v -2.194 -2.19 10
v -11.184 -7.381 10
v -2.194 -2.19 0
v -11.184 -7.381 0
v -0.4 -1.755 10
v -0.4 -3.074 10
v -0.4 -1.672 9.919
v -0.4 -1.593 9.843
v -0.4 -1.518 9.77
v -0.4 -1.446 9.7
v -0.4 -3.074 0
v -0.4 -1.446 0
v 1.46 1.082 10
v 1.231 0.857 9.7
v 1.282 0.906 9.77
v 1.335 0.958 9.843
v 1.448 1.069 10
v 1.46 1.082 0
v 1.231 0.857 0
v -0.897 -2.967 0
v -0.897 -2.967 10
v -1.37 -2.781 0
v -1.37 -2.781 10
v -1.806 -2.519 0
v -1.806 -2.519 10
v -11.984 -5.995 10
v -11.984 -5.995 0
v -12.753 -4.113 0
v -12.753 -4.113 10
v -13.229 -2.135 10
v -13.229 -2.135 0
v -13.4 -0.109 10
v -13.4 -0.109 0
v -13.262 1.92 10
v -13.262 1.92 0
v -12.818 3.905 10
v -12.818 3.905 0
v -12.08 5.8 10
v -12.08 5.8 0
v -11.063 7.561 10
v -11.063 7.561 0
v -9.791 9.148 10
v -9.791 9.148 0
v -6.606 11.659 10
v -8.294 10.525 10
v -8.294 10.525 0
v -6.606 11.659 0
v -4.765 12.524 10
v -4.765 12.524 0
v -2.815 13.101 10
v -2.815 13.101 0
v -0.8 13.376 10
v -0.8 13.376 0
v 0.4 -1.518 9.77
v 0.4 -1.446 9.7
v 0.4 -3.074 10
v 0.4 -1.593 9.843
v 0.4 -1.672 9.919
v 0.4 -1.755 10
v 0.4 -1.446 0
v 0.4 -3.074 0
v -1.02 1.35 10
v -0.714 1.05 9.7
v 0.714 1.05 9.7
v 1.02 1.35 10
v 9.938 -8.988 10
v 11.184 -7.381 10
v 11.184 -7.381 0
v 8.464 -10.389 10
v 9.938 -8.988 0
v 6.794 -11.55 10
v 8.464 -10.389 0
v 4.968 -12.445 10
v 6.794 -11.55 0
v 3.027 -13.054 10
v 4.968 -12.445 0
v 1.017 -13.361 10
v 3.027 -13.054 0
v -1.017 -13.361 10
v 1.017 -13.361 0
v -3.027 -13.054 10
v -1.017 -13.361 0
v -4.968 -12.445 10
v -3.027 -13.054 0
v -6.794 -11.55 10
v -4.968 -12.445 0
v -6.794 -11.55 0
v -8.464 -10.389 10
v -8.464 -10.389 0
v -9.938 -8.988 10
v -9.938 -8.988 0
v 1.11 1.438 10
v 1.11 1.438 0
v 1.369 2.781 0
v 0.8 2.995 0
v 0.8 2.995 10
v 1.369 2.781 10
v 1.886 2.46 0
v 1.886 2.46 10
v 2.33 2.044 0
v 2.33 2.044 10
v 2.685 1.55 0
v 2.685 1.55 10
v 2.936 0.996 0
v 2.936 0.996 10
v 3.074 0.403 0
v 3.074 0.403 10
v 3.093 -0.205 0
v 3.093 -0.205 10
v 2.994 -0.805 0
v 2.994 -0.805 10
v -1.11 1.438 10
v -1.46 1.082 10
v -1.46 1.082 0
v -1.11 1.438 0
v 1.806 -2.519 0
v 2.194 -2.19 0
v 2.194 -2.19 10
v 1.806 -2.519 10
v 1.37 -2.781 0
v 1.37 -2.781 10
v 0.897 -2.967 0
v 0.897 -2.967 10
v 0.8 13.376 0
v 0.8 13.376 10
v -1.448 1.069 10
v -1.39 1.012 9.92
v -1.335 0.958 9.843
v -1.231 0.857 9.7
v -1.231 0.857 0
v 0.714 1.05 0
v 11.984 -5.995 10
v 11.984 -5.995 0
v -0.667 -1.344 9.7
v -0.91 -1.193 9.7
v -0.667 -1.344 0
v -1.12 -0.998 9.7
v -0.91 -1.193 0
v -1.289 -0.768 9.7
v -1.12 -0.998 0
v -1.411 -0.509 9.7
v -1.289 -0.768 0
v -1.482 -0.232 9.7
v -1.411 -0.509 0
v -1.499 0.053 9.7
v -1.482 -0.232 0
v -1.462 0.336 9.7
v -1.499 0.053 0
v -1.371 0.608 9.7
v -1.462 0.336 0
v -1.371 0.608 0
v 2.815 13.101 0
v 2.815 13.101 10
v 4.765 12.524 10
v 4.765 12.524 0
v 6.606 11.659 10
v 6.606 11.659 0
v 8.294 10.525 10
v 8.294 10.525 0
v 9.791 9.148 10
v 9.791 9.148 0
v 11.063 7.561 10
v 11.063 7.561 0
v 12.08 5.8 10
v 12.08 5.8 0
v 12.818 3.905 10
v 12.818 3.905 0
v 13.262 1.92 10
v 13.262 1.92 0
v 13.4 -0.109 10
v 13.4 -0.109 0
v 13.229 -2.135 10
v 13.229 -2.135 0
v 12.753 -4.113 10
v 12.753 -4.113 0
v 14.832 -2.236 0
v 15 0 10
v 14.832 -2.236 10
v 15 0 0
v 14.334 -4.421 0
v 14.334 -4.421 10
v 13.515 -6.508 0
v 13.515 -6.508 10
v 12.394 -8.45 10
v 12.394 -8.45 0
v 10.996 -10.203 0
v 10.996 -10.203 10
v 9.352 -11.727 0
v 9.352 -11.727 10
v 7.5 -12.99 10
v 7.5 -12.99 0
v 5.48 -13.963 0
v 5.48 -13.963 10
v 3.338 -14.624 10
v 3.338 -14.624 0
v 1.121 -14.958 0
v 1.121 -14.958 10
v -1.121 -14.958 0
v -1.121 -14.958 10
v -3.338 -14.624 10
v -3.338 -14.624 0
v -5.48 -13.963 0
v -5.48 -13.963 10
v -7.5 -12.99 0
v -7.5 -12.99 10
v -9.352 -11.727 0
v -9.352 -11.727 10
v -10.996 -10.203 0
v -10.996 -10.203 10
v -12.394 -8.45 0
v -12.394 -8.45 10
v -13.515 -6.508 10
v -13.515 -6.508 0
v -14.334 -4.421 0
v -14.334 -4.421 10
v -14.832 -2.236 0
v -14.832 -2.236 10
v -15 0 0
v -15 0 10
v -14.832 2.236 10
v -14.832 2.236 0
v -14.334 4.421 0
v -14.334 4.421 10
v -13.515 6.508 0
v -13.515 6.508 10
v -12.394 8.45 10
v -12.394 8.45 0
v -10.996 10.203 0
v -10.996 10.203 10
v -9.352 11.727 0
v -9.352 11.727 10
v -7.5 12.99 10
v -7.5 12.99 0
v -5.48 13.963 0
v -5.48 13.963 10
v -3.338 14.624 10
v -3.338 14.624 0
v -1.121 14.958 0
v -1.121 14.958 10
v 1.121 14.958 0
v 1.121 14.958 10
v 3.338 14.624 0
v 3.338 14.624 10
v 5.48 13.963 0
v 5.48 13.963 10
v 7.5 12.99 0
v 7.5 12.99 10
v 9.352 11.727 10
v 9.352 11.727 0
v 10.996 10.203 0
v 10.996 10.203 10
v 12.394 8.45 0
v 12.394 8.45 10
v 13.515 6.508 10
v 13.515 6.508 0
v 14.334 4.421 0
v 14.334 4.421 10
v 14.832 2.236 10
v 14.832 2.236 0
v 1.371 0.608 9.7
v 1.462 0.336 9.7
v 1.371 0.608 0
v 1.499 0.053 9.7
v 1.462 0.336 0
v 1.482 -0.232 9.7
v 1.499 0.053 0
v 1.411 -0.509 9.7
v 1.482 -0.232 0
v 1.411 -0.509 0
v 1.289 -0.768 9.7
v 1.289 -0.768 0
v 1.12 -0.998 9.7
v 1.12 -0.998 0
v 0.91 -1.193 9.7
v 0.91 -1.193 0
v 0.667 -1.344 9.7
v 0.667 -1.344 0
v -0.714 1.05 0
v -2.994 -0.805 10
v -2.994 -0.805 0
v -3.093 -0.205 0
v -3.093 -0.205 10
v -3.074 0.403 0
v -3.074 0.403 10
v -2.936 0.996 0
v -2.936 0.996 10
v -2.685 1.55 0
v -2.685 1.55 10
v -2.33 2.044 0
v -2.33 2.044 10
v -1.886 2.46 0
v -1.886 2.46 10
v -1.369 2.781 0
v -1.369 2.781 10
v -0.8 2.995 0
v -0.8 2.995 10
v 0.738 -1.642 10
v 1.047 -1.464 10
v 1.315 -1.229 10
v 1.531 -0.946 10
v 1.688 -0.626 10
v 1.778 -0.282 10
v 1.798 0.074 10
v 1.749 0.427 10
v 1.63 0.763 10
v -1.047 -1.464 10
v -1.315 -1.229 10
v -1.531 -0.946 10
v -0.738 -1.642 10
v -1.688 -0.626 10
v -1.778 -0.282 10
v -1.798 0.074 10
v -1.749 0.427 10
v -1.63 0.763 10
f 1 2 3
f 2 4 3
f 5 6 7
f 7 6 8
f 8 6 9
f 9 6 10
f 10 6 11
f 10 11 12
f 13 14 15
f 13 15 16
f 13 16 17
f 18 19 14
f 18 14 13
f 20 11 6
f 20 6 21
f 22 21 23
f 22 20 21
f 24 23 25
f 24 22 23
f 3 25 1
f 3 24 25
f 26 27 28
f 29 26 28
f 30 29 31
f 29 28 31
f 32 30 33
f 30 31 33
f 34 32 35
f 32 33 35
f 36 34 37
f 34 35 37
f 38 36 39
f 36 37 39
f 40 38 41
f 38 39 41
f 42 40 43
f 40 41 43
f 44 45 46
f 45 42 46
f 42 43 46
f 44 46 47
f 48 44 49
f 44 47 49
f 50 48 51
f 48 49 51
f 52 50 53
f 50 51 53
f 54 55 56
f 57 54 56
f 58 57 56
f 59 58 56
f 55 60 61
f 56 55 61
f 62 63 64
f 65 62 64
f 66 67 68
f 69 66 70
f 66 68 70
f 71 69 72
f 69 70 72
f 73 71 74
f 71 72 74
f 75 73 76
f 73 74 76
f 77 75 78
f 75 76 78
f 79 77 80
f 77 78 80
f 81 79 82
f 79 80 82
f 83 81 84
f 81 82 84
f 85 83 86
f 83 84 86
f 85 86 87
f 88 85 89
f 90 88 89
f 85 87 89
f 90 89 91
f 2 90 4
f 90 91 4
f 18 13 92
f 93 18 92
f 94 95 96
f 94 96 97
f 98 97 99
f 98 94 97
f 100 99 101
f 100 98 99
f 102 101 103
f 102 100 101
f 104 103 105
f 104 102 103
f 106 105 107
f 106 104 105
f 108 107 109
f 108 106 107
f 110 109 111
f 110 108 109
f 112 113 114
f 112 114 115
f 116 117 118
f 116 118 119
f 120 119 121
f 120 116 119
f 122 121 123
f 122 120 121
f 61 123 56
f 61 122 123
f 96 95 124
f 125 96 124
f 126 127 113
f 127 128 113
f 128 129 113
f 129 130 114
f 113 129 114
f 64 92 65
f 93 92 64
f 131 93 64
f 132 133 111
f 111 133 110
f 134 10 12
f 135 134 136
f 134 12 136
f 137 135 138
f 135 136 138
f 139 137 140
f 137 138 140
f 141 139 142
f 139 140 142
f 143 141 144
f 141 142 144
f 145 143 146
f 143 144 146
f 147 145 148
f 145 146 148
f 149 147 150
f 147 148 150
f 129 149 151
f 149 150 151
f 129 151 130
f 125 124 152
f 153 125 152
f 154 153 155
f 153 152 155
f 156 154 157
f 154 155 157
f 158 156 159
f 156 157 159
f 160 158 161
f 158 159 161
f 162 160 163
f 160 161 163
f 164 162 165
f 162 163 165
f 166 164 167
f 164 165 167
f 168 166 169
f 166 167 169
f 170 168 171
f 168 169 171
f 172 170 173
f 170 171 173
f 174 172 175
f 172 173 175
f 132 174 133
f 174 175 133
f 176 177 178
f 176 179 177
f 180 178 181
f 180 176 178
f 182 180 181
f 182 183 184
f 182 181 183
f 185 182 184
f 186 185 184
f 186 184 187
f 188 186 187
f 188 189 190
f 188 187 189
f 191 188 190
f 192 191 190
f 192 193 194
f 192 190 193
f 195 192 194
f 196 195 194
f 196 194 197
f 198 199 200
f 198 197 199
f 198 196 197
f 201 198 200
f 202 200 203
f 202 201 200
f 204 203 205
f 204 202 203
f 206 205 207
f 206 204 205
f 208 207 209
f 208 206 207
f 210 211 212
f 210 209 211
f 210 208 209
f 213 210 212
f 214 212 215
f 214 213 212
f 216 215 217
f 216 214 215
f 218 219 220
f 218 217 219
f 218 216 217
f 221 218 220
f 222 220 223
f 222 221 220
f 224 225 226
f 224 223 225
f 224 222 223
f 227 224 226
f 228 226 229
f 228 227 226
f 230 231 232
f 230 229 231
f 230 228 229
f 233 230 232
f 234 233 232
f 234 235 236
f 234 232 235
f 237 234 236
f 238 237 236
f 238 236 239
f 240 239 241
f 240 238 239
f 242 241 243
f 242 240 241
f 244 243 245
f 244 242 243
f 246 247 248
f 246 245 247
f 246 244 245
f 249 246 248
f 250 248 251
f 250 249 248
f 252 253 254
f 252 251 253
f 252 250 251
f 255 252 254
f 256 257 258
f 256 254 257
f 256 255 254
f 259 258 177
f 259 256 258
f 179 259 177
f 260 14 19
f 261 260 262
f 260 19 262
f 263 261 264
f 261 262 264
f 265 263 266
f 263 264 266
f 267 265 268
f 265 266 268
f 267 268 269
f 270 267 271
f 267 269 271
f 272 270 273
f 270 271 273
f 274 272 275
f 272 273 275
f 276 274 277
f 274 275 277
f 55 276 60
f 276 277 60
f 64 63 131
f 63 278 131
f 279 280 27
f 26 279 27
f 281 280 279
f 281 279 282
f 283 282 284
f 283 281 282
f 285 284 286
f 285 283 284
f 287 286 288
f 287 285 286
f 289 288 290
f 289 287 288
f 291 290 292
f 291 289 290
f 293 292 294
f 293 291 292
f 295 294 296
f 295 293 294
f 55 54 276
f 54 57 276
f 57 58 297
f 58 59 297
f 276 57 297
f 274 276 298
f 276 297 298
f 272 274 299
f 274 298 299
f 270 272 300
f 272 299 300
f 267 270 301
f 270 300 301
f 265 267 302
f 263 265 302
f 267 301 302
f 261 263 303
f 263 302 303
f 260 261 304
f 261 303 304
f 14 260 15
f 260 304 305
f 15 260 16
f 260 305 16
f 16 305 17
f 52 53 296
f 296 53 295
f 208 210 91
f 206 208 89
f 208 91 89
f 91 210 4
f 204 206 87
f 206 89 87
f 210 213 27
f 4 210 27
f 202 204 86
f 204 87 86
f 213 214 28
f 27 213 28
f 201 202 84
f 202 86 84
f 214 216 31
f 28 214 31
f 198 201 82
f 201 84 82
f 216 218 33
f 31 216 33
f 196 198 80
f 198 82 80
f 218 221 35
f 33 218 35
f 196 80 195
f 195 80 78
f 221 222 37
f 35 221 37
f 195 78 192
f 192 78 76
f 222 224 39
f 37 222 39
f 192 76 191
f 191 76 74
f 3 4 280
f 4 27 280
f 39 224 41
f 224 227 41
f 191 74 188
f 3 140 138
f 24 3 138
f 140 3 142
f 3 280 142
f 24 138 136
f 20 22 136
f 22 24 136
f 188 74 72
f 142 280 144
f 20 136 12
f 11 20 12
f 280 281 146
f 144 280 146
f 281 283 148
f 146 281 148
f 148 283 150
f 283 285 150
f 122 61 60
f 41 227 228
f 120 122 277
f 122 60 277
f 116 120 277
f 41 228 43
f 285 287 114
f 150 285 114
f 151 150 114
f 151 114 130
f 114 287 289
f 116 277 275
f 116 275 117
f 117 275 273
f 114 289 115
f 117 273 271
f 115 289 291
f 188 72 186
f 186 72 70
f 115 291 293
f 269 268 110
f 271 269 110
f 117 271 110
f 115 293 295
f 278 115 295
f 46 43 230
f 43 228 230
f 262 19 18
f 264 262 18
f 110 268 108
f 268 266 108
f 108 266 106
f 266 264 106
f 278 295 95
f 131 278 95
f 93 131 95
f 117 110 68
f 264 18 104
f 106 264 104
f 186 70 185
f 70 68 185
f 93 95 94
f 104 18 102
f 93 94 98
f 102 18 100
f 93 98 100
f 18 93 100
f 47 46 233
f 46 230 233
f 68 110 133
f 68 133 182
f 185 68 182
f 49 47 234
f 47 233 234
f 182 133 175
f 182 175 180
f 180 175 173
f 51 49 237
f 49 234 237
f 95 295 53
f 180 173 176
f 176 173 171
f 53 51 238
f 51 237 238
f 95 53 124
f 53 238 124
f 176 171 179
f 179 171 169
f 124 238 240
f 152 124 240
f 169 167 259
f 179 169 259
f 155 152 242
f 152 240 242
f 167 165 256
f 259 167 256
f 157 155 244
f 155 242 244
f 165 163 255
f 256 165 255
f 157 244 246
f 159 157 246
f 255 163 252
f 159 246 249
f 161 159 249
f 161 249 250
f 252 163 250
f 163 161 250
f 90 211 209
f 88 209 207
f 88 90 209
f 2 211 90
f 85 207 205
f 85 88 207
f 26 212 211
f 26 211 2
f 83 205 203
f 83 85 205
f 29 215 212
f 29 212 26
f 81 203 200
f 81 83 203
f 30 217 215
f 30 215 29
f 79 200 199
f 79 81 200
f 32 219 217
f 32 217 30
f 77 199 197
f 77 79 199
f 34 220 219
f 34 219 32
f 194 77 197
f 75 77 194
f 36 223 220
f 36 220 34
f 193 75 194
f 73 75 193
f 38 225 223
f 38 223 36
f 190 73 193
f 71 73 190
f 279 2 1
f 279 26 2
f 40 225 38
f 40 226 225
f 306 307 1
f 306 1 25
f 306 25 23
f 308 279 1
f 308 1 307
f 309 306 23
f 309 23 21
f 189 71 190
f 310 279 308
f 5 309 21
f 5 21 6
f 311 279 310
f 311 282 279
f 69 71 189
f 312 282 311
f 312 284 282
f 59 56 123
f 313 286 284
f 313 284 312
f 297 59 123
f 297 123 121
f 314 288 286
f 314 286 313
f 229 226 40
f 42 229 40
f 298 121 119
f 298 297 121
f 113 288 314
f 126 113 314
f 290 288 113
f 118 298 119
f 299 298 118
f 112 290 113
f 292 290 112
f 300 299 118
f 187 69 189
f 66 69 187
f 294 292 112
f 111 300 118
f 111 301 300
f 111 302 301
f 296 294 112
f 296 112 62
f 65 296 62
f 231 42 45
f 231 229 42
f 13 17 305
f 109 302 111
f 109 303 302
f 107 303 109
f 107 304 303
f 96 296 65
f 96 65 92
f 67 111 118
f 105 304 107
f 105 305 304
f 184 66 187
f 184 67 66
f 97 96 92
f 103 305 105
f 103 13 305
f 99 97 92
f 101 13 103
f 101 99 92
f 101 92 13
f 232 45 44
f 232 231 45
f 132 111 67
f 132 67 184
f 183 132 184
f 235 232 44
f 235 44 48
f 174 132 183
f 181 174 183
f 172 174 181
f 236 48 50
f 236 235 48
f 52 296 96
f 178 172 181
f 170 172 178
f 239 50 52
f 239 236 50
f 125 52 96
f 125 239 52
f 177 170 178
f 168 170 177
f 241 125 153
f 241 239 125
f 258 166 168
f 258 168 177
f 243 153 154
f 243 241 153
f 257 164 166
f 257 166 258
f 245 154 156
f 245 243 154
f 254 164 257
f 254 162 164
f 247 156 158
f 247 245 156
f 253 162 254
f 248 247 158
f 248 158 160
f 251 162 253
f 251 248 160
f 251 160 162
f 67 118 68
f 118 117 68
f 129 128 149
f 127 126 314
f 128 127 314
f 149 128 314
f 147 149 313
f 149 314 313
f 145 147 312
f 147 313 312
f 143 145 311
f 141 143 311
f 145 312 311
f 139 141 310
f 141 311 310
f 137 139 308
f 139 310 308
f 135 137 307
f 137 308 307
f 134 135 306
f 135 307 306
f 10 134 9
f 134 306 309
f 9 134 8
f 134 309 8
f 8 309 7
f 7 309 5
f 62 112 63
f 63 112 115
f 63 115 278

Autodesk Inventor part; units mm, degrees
ref_plane "YZ Plane" through (0, 0, 0) normal (1, 0, 0) x (0, 1, 0)
ref_plane "XZ Plane" through (0, 0, 0) normal (0, 1, 0) x (-1, 0, 0)
ref_plane "XY Plane" through (0, 0, 0) normal (0, 0, 1) x (1, 0, 0)
sketch "スケッチ1" plane through (0, 0, 0) normal (0, 0, 1) x (1, 0, 0)
  circle A0 centre (0, 0) radius 1.5
  circle A1 centre (0, 0) radius 3.1
  line L0 (-0.4, 0) -> (0.4, 0)
  line L1 (0.4, 0) -> (0.4, -3.1)
  line L2 (0.4, -3.1) -> (-0.4, -3.1)
  line L3 (-0.4, -3.1) -> (-0.4, 0)
  line L4 (-1.0712, 1.05) -> (1.0712, 1.05)
  circle A2 centre (0, 0) radius 15
  circle A3 centre (0, 0) radius 13.4
  line L5 (-1.4605, 1.0815) -> (-1.1105, 1.4385)
  line L6 (-1.1105, 1.4385) -> (0.175, 0.1785)
  line L7 (0.175, 0.1785) -> (-0.175, -0.1785)
  line L8 (-0.175, -0.1785) -> (-1.4605, 1.0815)
  line L9 (1.4605, 1.0815) -> (1.1105, 1.4385)
  line L10 (1.1105, 1.4385) -> (-0.175, 0.1785)
  line L11 (-0.175, 0.1785) -> (0.175, -0.1785)
  line L12 (0.175, -0.1785) -> (1.4605, 1.0815)
  line L13 (0, 0) -> (-1.0712, 1.05) construction
  line L14 (1.0712, 1.05) -> (0, 0) construction
  point P0 (0.4, -1.4457)
  point P1 (0.4, -3.0741)
  point P2 (-0.4, -3.0741)
  point P3 (-0.4, -1.4457)
  point P4 (-0.7141, 1.05)
  point P5 (0.7141, 1.05)
  point P6 (1.2312, 0.8568)
  point P7 (-1.2312, 0.8568)
  dimension "SHAFT_D" = 3
  dimension "SLIT" = 0.8
  dimension "HUB_THIN" = 1.6
  dimension "d3" = 1.05
  dimension "WHEEL_D" = 30
  dimension "d5" = 1.6
  dimension "d18" = 0.5
  dimension "d19" = 1.8
extrude "ハブ＆リム" add sketch "スケッチ1" along normal blind 10 contours A0 L12 L9 L10 L6 L5 L8 L3 A1 L1 | L10 L4 L6 A0 | A2
sketch "スケッチ2" plane through (0, 0, 0) normal (0, 0, 1) x (1, 0, 0)
  line L0 (-0.8, 2.6) -> (0.8, 2.6)
  line L1 (0.8, 2.6) -> (0.8, 13.4)
  line L2 (0.8, 13.4) -> (-0.8, 13.4)
  line L3 (-0.8, 13.4) -> (-0.8, 2.6)
  circle A0 centre (0, 0) radius 13.4 projected
  point P0 (0, 13.4)
  dimension "d8" = 1.6
  dimension "d9" = 2.6
extrude "スポーク" add sketch "スケッチ2" along normal up to surface (10 mm away) contours L3 A0 L1 L0 | L3 L2 A0 | A0 L2 L1 picked at (0, 6.2)
pattern_circular "円形状パターン1" count 3 over 360 about axis through (0, 0, -10) along (0, 0, 1) of "スポーク"
chamfer "面取り1" distance 0.3 angle 45 3 edges at (-1.4109, -0.5094, 10) (0, 1.05, 10) (1.4109, -0.5094, 10)
equation "\"d5\" = HUB_THIN"
properties part number "D-Shaft_Wheel1"
